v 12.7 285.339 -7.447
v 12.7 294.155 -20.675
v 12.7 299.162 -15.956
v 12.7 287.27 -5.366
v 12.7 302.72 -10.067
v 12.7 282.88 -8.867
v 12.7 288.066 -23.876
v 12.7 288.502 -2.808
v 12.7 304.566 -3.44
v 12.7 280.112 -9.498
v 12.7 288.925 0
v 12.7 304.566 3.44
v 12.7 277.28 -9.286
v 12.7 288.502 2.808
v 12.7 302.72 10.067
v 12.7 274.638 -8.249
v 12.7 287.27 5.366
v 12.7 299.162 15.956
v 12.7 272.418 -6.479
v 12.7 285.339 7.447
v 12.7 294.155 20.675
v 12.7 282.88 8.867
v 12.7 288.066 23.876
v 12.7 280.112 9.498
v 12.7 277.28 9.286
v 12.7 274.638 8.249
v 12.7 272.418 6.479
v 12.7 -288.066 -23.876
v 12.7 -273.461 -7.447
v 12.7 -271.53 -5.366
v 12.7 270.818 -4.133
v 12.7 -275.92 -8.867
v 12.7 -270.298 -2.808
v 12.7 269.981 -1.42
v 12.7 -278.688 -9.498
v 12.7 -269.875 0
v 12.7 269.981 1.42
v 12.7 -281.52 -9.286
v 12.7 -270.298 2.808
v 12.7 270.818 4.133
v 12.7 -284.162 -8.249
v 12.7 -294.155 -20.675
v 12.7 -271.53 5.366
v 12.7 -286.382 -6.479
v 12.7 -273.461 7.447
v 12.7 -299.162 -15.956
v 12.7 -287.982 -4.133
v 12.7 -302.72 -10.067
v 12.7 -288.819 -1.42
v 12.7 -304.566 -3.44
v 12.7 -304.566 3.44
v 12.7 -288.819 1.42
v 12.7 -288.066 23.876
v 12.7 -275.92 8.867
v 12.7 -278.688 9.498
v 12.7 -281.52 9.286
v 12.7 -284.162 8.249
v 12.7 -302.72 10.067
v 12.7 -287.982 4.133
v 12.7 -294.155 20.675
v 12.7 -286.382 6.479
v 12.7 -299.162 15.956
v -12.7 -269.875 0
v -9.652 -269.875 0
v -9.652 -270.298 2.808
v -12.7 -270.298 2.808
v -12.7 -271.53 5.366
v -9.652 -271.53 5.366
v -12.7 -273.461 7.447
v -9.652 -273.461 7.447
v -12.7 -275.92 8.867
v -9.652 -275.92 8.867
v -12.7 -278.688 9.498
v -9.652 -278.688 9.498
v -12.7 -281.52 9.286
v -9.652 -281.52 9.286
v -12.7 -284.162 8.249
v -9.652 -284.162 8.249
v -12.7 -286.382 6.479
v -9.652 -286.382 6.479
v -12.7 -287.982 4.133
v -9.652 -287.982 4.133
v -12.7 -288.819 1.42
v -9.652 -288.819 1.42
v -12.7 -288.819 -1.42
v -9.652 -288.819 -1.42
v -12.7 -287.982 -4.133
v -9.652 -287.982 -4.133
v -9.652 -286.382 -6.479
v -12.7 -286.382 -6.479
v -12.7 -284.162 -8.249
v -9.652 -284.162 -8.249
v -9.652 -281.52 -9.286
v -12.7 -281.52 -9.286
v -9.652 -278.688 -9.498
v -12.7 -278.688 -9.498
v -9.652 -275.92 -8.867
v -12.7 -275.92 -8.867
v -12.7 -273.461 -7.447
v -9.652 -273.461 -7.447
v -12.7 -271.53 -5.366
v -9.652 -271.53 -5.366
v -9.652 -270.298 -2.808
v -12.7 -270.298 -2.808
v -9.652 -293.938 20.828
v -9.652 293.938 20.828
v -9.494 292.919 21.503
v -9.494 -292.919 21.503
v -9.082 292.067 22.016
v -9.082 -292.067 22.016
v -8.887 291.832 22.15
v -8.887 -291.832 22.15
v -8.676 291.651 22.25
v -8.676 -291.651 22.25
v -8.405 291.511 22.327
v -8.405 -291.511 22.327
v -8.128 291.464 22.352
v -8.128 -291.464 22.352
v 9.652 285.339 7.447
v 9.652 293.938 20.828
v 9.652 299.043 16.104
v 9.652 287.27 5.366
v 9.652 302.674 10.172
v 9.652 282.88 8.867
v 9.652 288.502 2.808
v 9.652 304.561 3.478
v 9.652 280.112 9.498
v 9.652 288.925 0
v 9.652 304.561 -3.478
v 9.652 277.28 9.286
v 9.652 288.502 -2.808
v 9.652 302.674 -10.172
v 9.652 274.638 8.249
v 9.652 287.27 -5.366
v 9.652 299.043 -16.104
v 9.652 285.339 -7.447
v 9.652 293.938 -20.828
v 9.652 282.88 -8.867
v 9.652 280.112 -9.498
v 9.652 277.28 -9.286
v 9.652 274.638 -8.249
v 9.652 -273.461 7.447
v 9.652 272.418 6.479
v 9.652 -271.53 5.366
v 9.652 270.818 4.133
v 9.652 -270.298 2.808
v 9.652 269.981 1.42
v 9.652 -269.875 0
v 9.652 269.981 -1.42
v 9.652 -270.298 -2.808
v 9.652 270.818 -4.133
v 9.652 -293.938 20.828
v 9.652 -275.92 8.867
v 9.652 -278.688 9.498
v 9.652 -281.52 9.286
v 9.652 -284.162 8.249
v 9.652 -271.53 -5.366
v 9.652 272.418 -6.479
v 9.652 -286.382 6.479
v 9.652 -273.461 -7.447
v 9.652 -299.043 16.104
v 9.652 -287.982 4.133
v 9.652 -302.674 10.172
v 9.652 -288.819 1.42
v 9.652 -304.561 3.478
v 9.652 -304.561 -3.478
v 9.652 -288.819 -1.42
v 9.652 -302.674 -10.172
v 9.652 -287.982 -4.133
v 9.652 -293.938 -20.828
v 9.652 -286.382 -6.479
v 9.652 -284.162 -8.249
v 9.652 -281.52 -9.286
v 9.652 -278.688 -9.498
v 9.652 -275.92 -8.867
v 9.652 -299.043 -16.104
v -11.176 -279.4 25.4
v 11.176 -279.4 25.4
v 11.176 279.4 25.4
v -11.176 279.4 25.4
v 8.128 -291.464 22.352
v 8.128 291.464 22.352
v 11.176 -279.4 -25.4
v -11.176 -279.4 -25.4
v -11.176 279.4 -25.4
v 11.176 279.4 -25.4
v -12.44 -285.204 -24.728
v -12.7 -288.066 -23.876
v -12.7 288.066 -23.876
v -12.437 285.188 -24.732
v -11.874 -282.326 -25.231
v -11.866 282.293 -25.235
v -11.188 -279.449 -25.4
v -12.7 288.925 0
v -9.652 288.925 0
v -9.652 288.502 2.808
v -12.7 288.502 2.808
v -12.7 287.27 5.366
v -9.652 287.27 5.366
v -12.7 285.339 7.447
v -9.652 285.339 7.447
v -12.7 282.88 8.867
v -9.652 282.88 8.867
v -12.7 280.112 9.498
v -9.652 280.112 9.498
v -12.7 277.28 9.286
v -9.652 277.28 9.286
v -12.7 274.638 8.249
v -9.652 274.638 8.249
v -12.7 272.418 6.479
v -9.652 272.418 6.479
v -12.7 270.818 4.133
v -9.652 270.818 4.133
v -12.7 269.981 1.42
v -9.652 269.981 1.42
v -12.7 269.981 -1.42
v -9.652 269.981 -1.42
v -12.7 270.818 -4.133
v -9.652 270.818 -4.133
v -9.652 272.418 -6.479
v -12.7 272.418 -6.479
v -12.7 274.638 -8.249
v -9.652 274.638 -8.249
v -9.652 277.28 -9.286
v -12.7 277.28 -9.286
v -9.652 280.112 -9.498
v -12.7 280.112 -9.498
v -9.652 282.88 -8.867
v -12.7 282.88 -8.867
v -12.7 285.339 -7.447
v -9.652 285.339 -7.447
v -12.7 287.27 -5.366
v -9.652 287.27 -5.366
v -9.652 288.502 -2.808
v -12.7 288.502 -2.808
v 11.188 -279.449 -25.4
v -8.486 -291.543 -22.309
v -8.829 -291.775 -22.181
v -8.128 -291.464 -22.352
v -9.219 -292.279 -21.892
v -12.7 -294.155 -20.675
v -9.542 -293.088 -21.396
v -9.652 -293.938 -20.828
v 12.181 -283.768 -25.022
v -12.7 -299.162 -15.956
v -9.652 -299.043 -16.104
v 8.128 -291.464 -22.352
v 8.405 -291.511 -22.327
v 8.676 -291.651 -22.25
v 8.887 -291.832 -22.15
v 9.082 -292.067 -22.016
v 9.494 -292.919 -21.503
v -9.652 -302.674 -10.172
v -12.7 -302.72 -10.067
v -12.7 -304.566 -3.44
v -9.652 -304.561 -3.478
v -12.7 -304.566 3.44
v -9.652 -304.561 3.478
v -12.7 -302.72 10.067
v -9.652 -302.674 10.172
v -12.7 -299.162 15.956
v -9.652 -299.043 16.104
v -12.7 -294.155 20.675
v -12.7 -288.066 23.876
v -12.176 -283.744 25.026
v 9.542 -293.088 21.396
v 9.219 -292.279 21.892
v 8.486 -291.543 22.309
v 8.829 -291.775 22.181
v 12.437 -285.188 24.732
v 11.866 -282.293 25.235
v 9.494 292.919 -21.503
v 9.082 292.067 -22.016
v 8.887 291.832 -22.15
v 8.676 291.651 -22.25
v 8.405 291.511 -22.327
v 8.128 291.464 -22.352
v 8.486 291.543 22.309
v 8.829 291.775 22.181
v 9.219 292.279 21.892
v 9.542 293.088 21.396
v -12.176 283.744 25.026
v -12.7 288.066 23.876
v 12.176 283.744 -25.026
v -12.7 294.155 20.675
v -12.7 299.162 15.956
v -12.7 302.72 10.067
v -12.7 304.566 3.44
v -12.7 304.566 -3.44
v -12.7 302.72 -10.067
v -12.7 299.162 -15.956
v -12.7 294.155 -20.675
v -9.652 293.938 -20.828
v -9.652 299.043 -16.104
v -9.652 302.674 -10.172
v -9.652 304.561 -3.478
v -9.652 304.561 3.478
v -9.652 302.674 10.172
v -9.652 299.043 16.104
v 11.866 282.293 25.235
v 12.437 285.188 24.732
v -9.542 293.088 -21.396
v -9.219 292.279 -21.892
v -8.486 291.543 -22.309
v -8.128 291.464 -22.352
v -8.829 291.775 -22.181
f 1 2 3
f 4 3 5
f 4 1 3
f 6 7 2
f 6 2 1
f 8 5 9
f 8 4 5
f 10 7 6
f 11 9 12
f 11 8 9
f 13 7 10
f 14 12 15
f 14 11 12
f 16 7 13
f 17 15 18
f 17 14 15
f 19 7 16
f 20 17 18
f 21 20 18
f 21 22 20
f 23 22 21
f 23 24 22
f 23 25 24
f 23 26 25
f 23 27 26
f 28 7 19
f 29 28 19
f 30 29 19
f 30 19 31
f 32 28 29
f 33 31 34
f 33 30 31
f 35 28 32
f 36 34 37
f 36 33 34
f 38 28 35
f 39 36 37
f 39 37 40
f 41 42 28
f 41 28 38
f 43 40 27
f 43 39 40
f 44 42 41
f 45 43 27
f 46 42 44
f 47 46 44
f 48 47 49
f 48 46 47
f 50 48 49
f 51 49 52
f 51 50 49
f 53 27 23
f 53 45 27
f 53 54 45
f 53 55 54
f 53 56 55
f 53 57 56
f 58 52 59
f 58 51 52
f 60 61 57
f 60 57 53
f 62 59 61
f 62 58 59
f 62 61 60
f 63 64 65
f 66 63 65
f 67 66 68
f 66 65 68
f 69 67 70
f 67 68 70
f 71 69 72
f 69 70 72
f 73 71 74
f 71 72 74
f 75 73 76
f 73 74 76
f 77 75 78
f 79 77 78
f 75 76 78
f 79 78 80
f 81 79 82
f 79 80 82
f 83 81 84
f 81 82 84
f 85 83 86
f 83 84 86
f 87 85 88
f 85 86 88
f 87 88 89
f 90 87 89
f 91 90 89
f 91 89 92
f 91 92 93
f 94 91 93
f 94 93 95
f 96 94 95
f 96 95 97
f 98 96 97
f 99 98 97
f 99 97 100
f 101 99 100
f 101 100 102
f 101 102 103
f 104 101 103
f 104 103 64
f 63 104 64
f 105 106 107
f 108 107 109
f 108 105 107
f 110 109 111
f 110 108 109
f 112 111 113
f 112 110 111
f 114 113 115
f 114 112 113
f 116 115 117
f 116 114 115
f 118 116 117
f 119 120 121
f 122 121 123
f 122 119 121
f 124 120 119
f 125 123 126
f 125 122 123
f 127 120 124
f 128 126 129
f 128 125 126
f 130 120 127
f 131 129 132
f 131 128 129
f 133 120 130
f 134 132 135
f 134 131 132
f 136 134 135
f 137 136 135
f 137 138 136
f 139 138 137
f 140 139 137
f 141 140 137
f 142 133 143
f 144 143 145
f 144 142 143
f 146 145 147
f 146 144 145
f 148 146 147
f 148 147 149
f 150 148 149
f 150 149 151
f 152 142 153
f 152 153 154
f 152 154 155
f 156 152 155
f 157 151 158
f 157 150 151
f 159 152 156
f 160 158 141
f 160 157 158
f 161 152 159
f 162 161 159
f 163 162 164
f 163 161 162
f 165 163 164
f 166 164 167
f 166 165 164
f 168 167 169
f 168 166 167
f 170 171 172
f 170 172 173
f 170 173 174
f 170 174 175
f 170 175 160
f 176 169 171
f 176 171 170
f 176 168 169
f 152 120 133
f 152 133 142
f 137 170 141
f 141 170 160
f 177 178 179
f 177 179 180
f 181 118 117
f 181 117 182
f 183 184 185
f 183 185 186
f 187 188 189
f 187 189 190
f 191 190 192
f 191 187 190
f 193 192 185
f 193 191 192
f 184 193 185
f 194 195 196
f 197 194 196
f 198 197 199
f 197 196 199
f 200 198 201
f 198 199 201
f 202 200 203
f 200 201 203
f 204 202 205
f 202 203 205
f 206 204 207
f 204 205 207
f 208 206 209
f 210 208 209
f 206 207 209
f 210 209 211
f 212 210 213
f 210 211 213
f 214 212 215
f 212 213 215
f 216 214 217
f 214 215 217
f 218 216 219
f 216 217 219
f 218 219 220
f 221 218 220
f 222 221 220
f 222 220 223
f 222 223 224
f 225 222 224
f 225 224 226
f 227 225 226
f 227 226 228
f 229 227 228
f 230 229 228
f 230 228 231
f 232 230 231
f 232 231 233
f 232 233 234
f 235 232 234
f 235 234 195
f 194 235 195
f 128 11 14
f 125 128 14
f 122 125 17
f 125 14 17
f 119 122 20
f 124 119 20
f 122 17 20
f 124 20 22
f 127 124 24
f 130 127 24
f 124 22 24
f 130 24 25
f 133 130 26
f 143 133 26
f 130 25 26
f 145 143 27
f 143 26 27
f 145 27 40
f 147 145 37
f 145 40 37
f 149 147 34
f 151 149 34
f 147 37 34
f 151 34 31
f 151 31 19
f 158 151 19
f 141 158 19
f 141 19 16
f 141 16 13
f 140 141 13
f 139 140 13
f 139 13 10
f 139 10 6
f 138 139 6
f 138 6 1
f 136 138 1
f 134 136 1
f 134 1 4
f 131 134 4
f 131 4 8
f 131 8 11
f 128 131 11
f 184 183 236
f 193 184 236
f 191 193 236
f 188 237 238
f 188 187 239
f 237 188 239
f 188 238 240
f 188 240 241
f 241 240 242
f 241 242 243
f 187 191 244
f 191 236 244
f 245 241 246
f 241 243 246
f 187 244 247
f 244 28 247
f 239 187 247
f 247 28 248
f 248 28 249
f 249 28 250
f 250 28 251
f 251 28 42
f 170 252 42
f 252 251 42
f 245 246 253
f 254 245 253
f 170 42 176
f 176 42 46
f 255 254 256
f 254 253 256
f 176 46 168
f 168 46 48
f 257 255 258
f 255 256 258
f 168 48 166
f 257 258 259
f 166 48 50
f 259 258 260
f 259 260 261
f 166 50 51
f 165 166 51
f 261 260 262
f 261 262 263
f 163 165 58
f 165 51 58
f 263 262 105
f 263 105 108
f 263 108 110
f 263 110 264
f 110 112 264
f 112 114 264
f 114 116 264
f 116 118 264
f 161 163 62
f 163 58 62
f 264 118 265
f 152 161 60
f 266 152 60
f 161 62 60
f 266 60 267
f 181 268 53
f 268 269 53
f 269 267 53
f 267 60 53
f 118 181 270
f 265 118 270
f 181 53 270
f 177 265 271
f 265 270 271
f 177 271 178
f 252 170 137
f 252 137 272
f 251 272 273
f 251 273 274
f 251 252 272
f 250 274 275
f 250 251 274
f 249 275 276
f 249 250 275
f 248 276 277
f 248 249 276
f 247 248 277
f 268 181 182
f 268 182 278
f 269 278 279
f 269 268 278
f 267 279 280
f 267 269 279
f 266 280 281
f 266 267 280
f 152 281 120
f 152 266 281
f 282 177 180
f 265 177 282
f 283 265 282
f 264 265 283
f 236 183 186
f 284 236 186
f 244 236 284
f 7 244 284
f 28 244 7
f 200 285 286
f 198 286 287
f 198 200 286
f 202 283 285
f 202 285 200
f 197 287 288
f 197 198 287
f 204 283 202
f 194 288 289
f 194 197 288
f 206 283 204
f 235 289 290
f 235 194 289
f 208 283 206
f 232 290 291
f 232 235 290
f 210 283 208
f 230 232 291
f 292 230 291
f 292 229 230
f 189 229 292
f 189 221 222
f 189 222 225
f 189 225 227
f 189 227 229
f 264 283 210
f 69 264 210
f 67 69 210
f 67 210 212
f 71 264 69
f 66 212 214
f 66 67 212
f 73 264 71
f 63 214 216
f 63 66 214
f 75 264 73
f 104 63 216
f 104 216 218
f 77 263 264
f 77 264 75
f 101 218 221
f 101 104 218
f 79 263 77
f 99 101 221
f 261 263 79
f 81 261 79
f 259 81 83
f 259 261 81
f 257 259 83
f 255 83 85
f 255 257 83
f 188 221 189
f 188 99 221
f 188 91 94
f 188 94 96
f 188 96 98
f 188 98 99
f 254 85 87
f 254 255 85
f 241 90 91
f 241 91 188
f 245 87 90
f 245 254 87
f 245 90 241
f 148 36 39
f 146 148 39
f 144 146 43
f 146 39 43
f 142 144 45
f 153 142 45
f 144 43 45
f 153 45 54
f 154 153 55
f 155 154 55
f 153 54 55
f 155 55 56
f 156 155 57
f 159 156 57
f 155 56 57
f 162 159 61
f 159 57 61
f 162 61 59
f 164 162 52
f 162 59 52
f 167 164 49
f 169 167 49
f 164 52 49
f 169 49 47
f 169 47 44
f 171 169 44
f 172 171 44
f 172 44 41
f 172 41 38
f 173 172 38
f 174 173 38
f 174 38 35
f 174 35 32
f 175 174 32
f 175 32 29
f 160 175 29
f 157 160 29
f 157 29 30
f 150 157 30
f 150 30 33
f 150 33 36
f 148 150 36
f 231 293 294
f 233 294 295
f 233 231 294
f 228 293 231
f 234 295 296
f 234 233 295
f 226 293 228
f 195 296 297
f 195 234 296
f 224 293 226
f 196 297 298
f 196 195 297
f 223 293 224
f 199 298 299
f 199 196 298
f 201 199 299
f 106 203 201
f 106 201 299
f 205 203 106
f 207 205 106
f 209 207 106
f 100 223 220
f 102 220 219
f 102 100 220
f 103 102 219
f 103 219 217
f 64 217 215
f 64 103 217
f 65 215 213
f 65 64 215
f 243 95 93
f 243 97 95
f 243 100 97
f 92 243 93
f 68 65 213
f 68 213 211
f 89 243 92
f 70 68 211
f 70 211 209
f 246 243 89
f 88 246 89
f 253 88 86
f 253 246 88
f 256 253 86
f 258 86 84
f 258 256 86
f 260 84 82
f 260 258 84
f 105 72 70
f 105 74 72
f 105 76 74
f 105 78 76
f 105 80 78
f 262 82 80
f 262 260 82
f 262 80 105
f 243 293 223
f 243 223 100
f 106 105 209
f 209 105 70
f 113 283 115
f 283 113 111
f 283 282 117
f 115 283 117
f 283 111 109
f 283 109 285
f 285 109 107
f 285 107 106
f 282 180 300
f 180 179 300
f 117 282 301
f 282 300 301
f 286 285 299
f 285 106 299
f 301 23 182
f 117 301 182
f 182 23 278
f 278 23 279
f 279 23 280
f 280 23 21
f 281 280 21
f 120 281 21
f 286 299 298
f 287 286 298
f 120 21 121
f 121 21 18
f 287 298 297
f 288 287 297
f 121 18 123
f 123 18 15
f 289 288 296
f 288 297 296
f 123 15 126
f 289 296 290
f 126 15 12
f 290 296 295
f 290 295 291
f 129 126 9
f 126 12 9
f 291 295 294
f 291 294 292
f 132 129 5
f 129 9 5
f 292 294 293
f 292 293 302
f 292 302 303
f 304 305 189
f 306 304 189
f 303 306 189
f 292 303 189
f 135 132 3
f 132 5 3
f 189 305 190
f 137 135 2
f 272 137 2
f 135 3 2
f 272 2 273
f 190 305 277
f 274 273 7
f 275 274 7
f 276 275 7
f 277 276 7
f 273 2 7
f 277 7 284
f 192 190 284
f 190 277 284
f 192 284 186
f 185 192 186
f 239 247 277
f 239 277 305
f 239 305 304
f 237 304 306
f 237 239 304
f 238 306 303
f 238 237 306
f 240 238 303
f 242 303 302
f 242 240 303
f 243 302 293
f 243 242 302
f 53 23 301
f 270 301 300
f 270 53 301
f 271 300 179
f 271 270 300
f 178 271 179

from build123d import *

# Parameters (mm, degrees)
F1_DEPTH = 304.8
F2_R     = 9.525
F3_DEPTH = 25.4
F5_DEPTH = 25.4


with BuildPart() as f1:
    # F0 (on Front) → F1 (new body, symmetric)
    with BuildSketch(Plane.XZ):
        with BuildLine():
            ThreePointArc((12.7, 23.876), (12.253631, 24.953631), (11.176, 25.4))
            Line((11.176, 25.4), (-11.176, 25.4))
            ThreePointArc((-11.176, 25.4), (-12.253631, 24.953631), (-12.7, 23.876))
            Line((-12.7, 23.876), (-12.7, -23.876))
            ThreePointArc((-12.7, -23.876), (-12.253631, -24.953631), (-11.176, -25.4))
            Line((-11.176, -25.4), (11.176, -25.4))
            ThreePointArc((11.176, -25.4), (12.253631, -24.953631), (12.7, -23.876))
            Line((12.7, -23.876), (12.7, 23.876))
        make_face()
        with BuildLine():
            Line((-8.128, 22.352), (8.128, 22.352))
            ThreePointArc((8.128, 22.352), (9.205631, 21.905631), (9.652, 20.828))
            Line((9.652, 20.828), (9.652, -20.828))
            ThreePointArc((9.652, -20.828), (9.205631, -21.905631), (8.128, -22.352))
            Line((8.128, -22.352), (-8.128, -22.352))
            ThreePointArc((-8.128, -22.352), (-9.205631, -21.905631), (-9.652, -20.828))
            Line((-9.652, -20.828), (-9.652, 20.828))
            ThreePointArc((-9.652, 20.828), (-9.205631, 21.905631), (-8.128, 22.352))
        make_face(mode=Mode.SUBTRACT)
    extrude(amount=F1_DEPTH, both=True)

    # F2 (on face) → F3 (cut)
    with BuildSketch(Plane.YZ.offset(12.7)):
        with Locations((-279.4, 0)):
            Circle(F2_R)
        with Locations((279.4, 0)):
            Circle(F2_R)
    extrude(amount=-F3_DEPTH, mode=Mode.SUBTRACT)

    # F4 (on face) → F5 (cut)
    with BuildSketch(Plane.YZ.offset(12.7)):
        with BuildLine():
            ThreePointArc((-279.4, -25.4), (-304.8, 0), (-279.4, 25.4))
            Line((-279.4, 25.4), (-279.4, 43.210469))
            Line((-279.4, 43.210469), (-315.057784, 43.210469))
            Line((-315.057784, 43.210469), (-315.057784, -40.735509))
            Line((-315.057784, -40.735509), (-279.4, -40.735509))
            Line((-279.4, -40.735509), (-279.4, -25.4))
        make_face()
        with BuildLine():
            Line((315.057784, -40.735509), (315.057784, 43.210469))
            Line((315.057784, 43.210469), (279.4, 43.210469))
            Line((279.4, 43.210469), (279.4, 25.4))
            ThreePointArc((279.4, 25.4), (304.8, 0), (279.4, -25.4))
            Line((279.4, -25.4), (279.4, -40.735509))
            Line((279.4, -40.735509), (315.057784, -40.735509))
        make_face()
    extrude(amount=-F5_DEPTH, mode=Mode.SUBTRACT)


solid = f1.part
